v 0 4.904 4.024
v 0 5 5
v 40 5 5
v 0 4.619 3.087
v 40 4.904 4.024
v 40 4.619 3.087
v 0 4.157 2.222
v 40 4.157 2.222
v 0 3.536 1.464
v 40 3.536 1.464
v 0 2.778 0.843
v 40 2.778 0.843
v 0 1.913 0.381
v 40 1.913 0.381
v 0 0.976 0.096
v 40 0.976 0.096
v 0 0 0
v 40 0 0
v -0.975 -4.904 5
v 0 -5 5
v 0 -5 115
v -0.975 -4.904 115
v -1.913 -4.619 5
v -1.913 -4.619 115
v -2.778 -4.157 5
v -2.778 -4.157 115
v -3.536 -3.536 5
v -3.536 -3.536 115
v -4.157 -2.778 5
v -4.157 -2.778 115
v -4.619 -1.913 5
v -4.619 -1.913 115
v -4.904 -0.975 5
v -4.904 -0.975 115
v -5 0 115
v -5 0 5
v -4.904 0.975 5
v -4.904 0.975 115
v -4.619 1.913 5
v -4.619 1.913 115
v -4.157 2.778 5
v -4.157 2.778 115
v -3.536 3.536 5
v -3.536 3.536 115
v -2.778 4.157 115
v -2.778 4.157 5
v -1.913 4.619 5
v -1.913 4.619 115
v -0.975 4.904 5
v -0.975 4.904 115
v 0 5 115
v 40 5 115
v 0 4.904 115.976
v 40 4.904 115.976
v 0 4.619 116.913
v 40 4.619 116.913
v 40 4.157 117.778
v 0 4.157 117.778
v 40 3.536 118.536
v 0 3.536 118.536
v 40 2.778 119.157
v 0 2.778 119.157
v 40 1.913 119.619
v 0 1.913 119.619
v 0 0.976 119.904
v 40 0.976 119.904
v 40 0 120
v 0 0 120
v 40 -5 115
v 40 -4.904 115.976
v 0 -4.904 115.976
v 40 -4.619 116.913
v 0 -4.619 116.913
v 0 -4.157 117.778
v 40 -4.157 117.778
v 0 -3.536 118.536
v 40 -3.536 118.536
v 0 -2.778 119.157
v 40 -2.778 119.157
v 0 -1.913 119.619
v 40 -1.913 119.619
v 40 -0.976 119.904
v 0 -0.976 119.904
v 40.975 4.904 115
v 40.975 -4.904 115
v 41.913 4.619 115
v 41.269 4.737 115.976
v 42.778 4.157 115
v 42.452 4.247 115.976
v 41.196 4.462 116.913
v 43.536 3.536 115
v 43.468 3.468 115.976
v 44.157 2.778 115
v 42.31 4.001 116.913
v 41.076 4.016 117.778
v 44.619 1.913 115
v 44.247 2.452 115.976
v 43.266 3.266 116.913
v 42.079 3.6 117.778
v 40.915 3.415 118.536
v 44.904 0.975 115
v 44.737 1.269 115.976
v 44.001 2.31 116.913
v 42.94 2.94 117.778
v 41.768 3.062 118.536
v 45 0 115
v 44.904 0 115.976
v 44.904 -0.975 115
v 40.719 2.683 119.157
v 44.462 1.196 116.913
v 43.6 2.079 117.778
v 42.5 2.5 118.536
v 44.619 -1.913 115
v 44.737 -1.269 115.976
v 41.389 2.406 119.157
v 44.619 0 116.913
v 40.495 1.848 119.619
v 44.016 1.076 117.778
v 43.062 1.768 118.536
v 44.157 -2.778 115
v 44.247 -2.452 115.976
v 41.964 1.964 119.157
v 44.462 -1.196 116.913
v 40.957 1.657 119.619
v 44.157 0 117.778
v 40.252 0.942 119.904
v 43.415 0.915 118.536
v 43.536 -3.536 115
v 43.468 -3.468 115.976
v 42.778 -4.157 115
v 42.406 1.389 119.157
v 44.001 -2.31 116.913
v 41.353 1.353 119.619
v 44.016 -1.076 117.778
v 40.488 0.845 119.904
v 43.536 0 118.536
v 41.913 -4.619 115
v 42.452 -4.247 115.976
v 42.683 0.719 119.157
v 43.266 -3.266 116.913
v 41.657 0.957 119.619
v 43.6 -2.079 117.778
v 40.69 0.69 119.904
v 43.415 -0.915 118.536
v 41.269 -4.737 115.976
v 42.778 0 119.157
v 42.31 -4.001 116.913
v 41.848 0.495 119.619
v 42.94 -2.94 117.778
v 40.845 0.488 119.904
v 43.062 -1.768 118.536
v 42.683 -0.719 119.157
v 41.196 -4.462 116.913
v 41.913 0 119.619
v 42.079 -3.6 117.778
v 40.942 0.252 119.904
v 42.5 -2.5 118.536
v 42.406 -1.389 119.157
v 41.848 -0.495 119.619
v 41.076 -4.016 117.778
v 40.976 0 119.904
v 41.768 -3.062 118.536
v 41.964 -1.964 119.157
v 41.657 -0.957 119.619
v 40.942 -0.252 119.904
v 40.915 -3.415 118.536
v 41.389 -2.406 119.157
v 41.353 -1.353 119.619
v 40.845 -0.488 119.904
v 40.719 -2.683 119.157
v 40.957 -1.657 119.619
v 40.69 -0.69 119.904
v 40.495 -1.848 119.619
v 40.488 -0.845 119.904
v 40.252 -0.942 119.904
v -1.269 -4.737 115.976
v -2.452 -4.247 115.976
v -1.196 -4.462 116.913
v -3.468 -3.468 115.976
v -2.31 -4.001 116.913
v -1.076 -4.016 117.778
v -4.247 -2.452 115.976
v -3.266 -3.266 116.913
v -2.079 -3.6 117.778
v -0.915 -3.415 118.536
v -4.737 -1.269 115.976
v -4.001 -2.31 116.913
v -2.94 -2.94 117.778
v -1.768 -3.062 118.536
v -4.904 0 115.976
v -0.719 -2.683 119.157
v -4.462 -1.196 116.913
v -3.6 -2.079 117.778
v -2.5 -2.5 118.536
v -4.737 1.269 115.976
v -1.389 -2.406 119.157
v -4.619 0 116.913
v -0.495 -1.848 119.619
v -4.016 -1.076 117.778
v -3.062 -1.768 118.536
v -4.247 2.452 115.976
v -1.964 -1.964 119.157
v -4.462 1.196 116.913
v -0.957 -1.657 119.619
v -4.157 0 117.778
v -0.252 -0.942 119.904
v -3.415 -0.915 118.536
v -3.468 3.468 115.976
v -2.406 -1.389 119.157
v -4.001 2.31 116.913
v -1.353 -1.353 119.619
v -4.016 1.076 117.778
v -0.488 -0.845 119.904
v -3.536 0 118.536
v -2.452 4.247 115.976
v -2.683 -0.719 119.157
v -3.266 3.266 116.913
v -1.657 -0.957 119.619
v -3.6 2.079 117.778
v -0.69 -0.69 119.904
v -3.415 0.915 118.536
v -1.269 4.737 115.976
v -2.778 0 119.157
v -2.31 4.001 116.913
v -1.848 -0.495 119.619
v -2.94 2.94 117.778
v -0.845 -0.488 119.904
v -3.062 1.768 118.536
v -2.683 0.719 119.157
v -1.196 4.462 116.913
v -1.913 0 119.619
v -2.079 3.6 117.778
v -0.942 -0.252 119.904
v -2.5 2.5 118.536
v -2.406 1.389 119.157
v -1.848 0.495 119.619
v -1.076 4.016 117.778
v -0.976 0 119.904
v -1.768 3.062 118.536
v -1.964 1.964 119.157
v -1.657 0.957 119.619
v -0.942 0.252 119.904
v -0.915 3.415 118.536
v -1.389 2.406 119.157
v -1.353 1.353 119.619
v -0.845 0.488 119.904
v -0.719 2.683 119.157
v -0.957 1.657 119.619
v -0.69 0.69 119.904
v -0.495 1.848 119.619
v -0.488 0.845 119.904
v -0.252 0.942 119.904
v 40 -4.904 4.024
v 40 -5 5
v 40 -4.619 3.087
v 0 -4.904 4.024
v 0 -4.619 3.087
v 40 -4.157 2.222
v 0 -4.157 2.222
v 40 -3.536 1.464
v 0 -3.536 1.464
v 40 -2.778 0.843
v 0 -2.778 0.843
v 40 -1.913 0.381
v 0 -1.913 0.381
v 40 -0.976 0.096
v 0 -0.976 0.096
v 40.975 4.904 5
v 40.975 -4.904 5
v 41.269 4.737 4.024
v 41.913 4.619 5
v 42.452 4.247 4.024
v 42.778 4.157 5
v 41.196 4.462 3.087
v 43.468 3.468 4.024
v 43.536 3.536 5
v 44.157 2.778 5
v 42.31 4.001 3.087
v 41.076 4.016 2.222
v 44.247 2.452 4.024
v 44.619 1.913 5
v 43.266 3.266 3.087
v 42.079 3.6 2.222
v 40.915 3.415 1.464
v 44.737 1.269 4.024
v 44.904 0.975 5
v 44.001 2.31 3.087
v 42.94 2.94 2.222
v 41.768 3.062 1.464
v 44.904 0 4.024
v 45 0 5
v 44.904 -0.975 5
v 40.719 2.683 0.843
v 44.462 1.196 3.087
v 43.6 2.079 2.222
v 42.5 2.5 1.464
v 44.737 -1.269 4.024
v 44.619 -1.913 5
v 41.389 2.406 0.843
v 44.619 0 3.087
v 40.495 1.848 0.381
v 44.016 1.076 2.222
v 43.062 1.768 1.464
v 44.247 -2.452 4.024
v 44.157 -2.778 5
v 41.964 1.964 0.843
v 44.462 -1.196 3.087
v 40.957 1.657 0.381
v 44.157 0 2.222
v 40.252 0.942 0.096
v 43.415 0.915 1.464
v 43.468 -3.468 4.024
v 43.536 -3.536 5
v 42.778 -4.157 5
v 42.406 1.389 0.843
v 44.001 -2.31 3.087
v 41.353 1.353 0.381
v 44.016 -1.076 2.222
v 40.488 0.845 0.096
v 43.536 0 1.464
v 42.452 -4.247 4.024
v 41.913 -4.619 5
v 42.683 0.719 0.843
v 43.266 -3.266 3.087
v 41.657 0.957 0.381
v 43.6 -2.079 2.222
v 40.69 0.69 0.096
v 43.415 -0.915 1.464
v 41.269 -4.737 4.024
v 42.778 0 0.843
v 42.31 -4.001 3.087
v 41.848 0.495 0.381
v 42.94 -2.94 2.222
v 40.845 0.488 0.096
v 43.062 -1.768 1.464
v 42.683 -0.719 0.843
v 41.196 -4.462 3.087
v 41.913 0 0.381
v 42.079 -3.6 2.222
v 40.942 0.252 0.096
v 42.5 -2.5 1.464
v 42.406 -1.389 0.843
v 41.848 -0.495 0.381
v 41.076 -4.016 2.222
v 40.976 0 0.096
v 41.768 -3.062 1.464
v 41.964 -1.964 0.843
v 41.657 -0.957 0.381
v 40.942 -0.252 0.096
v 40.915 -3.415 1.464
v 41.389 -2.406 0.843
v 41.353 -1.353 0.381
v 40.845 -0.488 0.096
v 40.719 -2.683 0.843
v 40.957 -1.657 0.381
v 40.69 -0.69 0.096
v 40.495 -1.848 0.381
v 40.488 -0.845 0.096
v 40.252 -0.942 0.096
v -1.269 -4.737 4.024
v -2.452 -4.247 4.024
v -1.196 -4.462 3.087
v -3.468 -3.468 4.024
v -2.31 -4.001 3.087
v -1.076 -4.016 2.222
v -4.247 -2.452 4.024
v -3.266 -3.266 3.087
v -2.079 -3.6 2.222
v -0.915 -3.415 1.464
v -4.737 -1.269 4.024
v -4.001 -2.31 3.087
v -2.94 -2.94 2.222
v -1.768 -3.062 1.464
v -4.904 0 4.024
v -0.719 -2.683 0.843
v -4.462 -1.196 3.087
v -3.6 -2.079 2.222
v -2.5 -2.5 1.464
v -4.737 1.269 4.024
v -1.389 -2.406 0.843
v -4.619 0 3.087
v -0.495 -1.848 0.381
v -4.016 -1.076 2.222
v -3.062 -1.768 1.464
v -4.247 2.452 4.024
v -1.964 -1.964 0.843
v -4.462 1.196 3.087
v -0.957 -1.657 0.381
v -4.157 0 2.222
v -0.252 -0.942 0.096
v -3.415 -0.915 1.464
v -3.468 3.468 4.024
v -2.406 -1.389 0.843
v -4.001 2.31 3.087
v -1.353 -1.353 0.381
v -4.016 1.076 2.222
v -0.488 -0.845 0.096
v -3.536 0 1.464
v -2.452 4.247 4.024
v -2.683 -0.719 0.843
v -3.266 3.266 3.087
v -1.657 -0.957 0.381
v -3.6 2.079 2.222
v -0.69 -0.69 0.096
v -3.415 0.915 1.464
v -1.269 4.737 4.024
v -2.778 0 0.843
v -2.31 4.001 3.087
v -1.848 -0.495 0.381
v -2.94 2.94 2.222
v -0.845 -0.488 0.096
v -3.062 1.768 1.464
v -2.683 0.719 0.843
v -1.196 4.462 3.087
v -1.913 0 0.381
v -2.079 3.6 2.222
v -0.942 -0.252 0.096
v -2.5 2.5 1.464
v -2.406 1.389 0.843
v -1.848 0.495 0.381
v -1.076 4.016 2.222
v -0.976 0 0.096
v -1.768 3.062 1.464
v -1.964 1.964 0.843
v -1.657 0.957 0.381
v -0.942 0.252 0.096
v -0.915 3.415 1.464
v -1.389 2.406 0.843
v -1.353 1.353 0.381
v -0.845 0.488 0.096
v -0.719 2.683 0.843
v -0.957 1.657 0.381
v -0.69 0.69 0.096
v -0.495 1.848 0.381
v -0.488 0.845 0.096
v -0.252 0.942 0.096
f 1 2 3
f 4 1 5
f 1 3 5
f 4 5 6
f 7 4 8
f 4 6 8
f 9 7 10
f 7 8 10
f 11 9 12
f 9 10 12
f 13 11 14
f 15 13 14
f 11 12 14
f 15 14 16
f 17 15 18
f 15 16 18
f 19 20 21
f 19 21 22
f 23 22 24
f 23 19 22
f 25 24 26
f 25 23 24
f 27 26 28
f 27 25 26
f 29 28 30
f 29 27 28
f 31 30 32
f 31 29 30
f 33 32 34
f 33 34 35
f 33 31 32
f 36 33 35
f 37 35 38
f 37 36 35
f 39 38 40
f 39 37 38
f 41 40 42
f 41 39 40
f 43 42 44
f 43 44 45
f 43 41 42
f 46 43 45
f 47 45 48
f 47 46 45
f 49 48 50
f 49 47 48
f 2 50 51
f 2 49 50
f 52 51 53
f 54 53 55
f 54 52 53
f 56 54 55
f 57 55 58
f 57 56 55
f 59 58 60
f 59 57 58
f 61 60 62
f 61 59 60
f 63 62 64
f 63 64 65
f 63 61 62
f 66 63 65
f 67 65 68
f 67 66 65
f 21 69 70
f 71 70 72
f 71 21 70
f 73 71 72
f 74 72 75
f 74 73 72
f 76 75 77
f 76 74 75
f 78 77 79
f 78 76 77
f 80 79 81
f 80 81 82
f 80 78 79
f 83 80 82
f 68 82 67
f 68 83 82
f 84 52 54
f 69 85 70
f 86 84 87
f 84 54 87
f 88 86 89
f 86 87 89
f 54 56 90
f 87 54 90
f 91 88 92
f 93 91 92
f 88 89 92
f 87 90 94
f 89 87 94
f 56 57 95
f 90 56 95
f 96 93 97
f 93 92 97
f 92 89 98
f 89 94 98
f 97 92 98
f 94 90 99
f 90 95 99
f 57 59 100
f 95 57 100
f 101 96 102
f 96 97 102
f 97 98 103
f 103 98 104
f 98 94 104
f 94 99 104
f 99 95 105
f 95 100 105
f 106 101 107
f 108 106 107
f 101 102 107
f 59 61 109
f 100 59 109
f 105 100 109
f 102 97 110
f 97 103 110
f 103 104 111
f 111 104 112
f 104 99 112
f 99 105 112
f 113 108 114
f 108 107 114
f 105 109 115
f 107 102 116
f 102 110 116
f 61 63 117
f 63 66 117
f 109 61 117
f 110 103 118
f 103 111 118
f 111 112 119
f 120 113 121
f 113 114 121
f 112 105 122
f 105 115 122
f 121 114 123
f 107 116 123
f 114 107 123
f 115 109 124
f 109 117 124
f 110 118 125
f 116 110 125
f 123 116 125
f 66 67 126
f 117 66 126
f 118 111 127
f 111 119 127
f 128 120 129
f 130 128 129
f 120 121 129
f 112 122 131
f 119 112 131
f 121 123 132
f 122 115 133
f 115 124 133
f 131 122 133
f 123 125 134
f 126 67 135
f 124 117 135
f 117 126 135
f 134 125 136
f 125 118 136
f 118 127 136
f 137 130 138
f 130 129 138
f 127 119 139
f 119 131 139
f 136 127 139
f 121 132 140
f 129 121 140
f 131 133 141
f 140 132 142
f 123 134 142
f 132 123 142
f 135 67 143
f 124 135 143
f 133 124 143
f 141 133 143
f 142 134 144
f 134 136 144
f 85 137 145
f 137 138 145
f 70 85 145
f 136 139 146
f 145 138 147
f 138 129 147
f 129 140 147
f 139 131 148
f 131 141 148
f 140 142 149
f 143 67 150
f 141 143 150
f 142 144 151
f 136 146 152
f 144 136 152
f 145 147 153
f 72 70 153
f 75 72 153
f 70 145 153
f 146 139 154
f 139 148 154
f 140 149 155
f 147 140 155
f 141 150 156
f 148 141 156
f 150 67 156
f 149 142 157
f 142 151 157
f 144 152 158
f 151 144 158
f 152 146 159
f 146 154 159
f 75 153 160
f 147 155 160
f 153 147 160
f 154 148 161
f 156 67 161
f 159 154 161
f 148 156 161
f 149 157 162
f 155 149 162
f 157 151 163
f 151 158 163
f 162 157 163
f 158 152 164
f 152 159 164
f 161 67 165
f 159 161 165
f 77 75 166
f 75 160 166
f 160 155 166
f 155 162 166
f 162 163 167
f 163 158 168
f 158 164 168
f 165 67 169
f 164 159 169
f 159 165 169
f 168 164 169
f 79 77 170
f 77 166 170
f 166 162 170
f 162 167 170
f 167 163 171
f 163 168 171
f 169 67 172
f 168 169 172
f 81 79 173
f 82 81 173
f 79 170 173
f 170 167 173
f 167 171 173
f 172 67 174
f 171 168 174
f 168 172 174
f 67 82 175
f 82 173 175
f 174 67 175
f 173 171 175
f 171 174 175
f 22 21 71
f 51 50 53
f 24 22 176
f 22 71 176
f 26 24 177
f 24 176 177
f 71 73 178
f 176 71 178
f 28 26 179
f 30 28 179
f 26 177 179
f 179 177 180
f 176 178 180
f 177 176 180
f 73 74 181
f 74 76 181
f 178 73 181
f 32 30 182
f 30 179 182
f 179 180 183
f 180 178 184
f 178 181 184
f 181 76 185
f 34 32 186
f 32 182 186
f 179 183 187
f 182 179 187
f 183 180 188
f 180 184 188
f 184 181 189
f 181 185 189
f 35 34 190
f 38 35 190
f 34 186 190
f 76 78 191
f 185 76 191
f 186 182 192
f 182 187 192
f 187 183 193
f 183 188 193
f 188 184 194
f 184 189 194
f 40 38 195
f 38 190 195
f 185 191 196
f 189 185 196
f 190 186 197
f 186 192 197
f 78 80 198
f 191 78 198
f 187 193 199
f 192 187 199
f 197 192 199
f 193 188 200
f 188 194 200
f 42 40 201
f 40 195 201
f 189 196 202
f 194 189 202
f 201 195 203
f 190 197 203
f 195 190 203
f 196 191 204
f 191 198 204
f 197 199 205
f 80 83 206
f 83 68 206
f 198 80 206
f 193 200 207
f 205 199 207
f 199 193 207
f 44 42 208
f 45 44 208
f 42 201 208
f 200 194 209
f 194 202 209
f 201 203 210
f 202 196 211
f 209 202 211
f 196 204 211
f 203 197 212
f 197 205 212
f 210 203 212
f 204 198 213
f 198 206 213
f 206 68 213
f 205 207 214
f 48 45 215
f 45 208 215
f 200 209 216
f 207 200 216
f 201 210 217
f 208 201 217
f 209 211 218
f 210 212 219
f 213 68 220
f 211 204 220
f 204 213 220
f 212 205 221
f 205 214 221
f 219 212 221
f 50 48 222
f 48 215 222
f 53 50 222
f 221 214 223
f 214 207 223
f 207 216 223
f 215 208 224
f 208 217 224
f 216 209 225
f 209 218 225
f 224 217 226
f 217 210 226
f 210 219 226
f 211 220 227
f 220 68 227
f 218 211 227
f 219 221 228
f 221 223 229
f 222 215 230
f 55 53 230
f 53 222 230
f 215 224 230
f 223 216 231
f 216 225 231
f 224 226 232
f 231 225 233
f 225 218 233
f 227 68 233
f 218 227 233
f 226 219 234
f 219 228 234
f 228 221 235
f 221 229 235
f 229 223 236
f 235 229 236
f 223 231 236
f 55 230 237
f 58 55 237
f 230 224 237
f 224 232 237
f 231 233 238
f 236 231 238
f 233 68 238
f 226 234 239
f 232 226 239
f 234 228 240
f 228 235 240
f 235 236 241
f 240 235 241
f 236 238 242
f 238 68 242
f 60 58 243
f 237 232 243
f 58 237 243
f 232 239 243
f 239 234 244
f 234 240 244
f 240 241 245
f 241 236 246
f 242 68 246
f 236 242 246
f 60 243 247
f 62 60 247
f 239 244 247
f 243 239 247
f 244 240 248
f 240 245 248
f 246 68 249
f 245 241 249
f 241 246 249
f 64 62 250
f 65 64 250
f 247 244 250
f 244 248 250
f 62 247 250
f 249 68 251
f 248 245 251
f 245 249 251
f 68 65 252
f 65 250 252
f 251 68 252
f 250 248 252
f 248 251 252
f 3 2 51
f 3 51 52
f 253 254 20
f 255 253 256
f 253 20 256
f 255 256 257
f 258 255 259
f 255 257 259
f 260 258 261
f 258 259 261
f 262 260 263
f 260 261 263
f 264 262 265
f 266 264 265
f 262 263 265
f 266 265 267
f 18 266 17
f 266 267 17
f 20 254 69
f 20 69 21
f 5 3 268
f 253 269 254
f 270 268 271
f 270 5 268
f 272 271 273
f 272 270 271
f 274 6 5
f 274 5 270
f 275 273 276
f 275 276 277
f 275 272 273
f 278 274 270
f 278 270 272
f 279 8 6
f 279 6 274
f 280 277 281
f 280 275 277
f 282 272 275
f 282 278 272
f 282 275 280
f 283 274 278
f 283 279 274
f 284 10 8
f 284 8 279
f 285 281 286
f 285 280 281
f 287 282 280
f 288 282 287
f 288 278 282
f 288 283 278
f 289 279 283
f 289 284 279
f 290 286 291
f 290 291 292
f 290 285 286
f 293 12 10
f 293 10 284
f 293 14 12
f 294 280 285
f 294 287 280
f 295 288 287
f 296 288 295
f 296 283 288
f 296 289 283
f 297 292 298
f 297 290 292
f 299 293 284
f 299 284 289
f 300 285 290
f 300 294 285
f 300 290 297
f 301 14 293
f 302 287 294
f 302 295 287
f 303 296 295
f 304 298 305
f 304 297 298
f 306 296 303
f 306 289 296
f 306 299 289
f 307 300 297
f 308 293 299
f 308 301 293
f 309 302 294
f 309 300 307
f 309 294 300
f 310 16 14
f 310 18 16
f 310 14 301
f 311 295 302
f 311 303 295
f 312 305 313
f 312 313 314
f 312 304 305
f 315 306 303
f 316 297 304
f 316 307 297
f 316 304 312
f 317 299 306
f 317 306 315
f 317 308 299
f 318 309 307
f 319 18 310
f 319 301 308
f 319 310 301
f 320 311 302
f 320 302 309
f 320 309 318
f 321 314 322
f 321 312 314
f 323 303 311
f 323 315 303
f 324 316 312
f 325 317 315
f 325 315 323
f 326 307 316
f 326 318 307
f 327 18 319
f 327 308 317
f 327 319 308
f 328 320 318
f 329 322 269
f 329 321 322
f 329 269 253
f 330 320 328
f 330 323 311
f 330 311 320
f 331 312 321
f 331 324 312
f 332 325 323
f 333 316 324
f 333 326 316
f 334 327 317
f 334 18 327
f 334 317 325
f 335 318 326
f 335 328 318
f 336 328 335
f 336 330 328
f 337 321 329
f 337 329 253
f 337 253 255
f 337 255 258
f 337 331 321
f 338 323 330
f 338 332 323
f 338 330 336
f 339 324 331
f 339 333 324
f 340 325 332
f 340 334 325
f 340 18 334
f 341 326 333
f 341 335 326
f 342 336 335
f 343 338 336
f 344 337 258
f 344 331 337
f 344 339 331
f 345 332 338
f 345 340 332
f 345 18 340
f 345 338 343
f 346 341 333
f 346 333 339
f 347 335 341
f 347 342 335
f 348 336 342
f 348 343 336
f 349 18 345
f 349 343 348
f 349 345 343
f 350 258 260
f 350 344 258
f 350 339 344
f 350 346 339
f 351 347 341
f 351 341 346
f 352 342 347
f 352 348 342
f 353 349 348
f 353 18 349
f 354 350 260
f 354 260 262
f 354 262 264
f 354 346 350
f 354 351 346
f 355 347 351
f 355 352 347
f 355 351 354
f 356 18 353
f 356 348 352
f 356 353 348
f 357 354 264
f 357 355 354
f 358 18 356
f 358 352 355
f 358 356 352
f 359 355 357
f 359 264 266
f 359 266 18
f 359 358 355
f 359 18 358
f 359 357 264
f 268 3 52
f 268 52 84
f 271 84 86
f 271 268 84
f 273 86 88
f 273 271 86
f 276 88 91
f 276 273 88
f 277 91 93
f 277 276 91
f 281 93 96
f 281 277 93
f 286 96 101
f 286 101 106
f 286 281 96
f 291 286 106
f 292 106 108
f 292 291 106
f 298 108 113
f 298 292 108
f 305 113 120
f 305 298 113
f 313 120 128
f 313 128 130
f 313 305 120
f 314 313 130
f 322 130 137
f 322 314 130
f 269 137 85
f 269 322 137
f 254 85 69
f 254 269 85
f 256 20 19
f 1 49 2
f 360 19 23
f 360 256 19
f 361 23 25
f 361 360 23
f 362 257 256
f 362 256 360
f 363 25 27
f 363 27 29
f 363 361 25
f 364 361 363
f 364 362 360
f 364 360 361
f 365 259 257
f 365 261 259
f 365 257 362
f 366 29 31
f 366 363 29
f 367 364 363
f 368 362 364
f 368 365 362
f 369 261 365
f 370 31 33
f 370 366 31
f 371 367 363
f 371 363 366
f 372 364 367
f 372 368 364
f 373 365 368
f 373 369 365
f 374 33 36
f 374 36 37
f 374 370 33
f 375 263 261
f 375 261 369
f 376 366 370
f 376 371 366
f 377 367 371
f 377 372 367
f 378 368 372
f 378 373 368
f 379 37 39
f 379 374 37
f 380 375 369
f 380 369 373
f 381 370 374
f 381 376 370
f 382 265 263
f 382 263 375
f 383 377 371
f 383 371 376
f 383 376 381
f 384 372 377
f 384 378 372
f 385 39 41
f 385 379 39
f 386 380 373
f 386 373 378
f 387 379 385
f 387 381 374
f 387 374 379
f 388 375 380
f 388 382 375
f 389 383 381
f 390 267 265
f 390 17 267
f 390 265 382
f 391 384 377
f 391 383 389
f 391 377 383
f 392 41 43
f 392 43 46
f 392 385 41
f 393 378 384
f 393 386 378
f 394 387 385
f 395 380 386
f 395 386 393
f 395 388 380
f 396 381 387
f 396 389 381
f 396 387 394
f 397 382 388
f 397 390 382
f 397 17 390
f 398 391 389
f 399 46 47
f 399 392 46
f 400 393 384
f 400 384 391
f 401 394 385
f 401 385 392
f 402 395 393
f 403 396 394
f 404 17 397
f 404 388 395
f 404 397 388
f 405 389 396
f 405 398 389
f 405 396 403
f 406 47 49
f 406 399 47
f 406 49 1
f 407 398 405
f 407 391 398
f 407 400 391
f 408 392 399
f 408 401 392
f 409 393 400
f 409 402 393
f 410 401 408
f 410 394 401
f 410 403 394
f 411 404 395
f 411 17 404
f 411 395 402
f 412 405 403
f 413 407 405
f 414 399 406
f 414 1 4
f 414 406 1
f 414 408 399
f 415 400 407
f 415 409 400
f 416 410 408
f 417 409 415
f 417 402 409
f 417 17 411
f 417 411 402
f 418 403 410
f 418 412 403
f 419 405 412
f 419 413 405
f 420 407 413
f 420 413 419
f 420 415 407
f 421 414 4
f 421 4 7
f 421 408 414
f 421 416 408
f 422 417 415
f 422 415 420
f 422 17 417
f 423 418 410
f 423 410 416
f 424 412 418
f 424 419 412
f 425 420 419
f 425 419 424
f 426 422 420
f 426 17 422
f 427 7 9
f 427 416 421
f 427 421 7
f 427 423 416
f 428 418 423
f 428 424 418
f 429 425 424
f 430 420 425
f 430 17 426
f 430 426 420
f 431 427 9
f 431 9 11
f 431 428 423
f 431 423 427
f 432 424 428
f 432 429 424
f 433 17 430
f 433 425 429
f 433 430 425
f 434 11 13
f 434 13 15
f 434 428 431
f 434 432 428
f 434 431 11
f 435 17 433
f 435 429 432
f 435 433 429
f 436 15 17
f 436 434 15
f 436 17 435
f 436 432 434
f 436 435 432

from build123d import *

# Parameters (mm, degrees)
BOSS_EXTRUDE1_DEPTH = 120
FILLET1_R           = 5


with BuildPart() as part:
    # Sketch1 → Boss-Extrude1 (new body)
    with BuildSketch(Plane.XY):
        with BuildLine():
            Line((0, 5), (40, 5))
            ThreePointArc((40, 5), (45, 0), (40, -5))
            Line((40, -5), (0, -5))
            ThreePointArc((0, -5), (-5, 0), (0, 5))
        make_face()
    extrude(amount=BOSS_EXTRUDE1_DEPTH)

    # Fillet1
    fillet1_edges = [part.edges().sort_by_distance(p)[0] for p in [
        (45, 0, 120),
        (20, 5, 120),
        (-5, 0, 120),
        (20, 5, 0),
        (45, 0, 0),
        (20, -5, 0),
        (-5, 0, 0),
        (20, -5, 120),
    ]]
    fillet(fillet1_edges, radius=FILLET1_R - 0.0001)  # a hair under: the kernel refuses the full size


solid = part.part
